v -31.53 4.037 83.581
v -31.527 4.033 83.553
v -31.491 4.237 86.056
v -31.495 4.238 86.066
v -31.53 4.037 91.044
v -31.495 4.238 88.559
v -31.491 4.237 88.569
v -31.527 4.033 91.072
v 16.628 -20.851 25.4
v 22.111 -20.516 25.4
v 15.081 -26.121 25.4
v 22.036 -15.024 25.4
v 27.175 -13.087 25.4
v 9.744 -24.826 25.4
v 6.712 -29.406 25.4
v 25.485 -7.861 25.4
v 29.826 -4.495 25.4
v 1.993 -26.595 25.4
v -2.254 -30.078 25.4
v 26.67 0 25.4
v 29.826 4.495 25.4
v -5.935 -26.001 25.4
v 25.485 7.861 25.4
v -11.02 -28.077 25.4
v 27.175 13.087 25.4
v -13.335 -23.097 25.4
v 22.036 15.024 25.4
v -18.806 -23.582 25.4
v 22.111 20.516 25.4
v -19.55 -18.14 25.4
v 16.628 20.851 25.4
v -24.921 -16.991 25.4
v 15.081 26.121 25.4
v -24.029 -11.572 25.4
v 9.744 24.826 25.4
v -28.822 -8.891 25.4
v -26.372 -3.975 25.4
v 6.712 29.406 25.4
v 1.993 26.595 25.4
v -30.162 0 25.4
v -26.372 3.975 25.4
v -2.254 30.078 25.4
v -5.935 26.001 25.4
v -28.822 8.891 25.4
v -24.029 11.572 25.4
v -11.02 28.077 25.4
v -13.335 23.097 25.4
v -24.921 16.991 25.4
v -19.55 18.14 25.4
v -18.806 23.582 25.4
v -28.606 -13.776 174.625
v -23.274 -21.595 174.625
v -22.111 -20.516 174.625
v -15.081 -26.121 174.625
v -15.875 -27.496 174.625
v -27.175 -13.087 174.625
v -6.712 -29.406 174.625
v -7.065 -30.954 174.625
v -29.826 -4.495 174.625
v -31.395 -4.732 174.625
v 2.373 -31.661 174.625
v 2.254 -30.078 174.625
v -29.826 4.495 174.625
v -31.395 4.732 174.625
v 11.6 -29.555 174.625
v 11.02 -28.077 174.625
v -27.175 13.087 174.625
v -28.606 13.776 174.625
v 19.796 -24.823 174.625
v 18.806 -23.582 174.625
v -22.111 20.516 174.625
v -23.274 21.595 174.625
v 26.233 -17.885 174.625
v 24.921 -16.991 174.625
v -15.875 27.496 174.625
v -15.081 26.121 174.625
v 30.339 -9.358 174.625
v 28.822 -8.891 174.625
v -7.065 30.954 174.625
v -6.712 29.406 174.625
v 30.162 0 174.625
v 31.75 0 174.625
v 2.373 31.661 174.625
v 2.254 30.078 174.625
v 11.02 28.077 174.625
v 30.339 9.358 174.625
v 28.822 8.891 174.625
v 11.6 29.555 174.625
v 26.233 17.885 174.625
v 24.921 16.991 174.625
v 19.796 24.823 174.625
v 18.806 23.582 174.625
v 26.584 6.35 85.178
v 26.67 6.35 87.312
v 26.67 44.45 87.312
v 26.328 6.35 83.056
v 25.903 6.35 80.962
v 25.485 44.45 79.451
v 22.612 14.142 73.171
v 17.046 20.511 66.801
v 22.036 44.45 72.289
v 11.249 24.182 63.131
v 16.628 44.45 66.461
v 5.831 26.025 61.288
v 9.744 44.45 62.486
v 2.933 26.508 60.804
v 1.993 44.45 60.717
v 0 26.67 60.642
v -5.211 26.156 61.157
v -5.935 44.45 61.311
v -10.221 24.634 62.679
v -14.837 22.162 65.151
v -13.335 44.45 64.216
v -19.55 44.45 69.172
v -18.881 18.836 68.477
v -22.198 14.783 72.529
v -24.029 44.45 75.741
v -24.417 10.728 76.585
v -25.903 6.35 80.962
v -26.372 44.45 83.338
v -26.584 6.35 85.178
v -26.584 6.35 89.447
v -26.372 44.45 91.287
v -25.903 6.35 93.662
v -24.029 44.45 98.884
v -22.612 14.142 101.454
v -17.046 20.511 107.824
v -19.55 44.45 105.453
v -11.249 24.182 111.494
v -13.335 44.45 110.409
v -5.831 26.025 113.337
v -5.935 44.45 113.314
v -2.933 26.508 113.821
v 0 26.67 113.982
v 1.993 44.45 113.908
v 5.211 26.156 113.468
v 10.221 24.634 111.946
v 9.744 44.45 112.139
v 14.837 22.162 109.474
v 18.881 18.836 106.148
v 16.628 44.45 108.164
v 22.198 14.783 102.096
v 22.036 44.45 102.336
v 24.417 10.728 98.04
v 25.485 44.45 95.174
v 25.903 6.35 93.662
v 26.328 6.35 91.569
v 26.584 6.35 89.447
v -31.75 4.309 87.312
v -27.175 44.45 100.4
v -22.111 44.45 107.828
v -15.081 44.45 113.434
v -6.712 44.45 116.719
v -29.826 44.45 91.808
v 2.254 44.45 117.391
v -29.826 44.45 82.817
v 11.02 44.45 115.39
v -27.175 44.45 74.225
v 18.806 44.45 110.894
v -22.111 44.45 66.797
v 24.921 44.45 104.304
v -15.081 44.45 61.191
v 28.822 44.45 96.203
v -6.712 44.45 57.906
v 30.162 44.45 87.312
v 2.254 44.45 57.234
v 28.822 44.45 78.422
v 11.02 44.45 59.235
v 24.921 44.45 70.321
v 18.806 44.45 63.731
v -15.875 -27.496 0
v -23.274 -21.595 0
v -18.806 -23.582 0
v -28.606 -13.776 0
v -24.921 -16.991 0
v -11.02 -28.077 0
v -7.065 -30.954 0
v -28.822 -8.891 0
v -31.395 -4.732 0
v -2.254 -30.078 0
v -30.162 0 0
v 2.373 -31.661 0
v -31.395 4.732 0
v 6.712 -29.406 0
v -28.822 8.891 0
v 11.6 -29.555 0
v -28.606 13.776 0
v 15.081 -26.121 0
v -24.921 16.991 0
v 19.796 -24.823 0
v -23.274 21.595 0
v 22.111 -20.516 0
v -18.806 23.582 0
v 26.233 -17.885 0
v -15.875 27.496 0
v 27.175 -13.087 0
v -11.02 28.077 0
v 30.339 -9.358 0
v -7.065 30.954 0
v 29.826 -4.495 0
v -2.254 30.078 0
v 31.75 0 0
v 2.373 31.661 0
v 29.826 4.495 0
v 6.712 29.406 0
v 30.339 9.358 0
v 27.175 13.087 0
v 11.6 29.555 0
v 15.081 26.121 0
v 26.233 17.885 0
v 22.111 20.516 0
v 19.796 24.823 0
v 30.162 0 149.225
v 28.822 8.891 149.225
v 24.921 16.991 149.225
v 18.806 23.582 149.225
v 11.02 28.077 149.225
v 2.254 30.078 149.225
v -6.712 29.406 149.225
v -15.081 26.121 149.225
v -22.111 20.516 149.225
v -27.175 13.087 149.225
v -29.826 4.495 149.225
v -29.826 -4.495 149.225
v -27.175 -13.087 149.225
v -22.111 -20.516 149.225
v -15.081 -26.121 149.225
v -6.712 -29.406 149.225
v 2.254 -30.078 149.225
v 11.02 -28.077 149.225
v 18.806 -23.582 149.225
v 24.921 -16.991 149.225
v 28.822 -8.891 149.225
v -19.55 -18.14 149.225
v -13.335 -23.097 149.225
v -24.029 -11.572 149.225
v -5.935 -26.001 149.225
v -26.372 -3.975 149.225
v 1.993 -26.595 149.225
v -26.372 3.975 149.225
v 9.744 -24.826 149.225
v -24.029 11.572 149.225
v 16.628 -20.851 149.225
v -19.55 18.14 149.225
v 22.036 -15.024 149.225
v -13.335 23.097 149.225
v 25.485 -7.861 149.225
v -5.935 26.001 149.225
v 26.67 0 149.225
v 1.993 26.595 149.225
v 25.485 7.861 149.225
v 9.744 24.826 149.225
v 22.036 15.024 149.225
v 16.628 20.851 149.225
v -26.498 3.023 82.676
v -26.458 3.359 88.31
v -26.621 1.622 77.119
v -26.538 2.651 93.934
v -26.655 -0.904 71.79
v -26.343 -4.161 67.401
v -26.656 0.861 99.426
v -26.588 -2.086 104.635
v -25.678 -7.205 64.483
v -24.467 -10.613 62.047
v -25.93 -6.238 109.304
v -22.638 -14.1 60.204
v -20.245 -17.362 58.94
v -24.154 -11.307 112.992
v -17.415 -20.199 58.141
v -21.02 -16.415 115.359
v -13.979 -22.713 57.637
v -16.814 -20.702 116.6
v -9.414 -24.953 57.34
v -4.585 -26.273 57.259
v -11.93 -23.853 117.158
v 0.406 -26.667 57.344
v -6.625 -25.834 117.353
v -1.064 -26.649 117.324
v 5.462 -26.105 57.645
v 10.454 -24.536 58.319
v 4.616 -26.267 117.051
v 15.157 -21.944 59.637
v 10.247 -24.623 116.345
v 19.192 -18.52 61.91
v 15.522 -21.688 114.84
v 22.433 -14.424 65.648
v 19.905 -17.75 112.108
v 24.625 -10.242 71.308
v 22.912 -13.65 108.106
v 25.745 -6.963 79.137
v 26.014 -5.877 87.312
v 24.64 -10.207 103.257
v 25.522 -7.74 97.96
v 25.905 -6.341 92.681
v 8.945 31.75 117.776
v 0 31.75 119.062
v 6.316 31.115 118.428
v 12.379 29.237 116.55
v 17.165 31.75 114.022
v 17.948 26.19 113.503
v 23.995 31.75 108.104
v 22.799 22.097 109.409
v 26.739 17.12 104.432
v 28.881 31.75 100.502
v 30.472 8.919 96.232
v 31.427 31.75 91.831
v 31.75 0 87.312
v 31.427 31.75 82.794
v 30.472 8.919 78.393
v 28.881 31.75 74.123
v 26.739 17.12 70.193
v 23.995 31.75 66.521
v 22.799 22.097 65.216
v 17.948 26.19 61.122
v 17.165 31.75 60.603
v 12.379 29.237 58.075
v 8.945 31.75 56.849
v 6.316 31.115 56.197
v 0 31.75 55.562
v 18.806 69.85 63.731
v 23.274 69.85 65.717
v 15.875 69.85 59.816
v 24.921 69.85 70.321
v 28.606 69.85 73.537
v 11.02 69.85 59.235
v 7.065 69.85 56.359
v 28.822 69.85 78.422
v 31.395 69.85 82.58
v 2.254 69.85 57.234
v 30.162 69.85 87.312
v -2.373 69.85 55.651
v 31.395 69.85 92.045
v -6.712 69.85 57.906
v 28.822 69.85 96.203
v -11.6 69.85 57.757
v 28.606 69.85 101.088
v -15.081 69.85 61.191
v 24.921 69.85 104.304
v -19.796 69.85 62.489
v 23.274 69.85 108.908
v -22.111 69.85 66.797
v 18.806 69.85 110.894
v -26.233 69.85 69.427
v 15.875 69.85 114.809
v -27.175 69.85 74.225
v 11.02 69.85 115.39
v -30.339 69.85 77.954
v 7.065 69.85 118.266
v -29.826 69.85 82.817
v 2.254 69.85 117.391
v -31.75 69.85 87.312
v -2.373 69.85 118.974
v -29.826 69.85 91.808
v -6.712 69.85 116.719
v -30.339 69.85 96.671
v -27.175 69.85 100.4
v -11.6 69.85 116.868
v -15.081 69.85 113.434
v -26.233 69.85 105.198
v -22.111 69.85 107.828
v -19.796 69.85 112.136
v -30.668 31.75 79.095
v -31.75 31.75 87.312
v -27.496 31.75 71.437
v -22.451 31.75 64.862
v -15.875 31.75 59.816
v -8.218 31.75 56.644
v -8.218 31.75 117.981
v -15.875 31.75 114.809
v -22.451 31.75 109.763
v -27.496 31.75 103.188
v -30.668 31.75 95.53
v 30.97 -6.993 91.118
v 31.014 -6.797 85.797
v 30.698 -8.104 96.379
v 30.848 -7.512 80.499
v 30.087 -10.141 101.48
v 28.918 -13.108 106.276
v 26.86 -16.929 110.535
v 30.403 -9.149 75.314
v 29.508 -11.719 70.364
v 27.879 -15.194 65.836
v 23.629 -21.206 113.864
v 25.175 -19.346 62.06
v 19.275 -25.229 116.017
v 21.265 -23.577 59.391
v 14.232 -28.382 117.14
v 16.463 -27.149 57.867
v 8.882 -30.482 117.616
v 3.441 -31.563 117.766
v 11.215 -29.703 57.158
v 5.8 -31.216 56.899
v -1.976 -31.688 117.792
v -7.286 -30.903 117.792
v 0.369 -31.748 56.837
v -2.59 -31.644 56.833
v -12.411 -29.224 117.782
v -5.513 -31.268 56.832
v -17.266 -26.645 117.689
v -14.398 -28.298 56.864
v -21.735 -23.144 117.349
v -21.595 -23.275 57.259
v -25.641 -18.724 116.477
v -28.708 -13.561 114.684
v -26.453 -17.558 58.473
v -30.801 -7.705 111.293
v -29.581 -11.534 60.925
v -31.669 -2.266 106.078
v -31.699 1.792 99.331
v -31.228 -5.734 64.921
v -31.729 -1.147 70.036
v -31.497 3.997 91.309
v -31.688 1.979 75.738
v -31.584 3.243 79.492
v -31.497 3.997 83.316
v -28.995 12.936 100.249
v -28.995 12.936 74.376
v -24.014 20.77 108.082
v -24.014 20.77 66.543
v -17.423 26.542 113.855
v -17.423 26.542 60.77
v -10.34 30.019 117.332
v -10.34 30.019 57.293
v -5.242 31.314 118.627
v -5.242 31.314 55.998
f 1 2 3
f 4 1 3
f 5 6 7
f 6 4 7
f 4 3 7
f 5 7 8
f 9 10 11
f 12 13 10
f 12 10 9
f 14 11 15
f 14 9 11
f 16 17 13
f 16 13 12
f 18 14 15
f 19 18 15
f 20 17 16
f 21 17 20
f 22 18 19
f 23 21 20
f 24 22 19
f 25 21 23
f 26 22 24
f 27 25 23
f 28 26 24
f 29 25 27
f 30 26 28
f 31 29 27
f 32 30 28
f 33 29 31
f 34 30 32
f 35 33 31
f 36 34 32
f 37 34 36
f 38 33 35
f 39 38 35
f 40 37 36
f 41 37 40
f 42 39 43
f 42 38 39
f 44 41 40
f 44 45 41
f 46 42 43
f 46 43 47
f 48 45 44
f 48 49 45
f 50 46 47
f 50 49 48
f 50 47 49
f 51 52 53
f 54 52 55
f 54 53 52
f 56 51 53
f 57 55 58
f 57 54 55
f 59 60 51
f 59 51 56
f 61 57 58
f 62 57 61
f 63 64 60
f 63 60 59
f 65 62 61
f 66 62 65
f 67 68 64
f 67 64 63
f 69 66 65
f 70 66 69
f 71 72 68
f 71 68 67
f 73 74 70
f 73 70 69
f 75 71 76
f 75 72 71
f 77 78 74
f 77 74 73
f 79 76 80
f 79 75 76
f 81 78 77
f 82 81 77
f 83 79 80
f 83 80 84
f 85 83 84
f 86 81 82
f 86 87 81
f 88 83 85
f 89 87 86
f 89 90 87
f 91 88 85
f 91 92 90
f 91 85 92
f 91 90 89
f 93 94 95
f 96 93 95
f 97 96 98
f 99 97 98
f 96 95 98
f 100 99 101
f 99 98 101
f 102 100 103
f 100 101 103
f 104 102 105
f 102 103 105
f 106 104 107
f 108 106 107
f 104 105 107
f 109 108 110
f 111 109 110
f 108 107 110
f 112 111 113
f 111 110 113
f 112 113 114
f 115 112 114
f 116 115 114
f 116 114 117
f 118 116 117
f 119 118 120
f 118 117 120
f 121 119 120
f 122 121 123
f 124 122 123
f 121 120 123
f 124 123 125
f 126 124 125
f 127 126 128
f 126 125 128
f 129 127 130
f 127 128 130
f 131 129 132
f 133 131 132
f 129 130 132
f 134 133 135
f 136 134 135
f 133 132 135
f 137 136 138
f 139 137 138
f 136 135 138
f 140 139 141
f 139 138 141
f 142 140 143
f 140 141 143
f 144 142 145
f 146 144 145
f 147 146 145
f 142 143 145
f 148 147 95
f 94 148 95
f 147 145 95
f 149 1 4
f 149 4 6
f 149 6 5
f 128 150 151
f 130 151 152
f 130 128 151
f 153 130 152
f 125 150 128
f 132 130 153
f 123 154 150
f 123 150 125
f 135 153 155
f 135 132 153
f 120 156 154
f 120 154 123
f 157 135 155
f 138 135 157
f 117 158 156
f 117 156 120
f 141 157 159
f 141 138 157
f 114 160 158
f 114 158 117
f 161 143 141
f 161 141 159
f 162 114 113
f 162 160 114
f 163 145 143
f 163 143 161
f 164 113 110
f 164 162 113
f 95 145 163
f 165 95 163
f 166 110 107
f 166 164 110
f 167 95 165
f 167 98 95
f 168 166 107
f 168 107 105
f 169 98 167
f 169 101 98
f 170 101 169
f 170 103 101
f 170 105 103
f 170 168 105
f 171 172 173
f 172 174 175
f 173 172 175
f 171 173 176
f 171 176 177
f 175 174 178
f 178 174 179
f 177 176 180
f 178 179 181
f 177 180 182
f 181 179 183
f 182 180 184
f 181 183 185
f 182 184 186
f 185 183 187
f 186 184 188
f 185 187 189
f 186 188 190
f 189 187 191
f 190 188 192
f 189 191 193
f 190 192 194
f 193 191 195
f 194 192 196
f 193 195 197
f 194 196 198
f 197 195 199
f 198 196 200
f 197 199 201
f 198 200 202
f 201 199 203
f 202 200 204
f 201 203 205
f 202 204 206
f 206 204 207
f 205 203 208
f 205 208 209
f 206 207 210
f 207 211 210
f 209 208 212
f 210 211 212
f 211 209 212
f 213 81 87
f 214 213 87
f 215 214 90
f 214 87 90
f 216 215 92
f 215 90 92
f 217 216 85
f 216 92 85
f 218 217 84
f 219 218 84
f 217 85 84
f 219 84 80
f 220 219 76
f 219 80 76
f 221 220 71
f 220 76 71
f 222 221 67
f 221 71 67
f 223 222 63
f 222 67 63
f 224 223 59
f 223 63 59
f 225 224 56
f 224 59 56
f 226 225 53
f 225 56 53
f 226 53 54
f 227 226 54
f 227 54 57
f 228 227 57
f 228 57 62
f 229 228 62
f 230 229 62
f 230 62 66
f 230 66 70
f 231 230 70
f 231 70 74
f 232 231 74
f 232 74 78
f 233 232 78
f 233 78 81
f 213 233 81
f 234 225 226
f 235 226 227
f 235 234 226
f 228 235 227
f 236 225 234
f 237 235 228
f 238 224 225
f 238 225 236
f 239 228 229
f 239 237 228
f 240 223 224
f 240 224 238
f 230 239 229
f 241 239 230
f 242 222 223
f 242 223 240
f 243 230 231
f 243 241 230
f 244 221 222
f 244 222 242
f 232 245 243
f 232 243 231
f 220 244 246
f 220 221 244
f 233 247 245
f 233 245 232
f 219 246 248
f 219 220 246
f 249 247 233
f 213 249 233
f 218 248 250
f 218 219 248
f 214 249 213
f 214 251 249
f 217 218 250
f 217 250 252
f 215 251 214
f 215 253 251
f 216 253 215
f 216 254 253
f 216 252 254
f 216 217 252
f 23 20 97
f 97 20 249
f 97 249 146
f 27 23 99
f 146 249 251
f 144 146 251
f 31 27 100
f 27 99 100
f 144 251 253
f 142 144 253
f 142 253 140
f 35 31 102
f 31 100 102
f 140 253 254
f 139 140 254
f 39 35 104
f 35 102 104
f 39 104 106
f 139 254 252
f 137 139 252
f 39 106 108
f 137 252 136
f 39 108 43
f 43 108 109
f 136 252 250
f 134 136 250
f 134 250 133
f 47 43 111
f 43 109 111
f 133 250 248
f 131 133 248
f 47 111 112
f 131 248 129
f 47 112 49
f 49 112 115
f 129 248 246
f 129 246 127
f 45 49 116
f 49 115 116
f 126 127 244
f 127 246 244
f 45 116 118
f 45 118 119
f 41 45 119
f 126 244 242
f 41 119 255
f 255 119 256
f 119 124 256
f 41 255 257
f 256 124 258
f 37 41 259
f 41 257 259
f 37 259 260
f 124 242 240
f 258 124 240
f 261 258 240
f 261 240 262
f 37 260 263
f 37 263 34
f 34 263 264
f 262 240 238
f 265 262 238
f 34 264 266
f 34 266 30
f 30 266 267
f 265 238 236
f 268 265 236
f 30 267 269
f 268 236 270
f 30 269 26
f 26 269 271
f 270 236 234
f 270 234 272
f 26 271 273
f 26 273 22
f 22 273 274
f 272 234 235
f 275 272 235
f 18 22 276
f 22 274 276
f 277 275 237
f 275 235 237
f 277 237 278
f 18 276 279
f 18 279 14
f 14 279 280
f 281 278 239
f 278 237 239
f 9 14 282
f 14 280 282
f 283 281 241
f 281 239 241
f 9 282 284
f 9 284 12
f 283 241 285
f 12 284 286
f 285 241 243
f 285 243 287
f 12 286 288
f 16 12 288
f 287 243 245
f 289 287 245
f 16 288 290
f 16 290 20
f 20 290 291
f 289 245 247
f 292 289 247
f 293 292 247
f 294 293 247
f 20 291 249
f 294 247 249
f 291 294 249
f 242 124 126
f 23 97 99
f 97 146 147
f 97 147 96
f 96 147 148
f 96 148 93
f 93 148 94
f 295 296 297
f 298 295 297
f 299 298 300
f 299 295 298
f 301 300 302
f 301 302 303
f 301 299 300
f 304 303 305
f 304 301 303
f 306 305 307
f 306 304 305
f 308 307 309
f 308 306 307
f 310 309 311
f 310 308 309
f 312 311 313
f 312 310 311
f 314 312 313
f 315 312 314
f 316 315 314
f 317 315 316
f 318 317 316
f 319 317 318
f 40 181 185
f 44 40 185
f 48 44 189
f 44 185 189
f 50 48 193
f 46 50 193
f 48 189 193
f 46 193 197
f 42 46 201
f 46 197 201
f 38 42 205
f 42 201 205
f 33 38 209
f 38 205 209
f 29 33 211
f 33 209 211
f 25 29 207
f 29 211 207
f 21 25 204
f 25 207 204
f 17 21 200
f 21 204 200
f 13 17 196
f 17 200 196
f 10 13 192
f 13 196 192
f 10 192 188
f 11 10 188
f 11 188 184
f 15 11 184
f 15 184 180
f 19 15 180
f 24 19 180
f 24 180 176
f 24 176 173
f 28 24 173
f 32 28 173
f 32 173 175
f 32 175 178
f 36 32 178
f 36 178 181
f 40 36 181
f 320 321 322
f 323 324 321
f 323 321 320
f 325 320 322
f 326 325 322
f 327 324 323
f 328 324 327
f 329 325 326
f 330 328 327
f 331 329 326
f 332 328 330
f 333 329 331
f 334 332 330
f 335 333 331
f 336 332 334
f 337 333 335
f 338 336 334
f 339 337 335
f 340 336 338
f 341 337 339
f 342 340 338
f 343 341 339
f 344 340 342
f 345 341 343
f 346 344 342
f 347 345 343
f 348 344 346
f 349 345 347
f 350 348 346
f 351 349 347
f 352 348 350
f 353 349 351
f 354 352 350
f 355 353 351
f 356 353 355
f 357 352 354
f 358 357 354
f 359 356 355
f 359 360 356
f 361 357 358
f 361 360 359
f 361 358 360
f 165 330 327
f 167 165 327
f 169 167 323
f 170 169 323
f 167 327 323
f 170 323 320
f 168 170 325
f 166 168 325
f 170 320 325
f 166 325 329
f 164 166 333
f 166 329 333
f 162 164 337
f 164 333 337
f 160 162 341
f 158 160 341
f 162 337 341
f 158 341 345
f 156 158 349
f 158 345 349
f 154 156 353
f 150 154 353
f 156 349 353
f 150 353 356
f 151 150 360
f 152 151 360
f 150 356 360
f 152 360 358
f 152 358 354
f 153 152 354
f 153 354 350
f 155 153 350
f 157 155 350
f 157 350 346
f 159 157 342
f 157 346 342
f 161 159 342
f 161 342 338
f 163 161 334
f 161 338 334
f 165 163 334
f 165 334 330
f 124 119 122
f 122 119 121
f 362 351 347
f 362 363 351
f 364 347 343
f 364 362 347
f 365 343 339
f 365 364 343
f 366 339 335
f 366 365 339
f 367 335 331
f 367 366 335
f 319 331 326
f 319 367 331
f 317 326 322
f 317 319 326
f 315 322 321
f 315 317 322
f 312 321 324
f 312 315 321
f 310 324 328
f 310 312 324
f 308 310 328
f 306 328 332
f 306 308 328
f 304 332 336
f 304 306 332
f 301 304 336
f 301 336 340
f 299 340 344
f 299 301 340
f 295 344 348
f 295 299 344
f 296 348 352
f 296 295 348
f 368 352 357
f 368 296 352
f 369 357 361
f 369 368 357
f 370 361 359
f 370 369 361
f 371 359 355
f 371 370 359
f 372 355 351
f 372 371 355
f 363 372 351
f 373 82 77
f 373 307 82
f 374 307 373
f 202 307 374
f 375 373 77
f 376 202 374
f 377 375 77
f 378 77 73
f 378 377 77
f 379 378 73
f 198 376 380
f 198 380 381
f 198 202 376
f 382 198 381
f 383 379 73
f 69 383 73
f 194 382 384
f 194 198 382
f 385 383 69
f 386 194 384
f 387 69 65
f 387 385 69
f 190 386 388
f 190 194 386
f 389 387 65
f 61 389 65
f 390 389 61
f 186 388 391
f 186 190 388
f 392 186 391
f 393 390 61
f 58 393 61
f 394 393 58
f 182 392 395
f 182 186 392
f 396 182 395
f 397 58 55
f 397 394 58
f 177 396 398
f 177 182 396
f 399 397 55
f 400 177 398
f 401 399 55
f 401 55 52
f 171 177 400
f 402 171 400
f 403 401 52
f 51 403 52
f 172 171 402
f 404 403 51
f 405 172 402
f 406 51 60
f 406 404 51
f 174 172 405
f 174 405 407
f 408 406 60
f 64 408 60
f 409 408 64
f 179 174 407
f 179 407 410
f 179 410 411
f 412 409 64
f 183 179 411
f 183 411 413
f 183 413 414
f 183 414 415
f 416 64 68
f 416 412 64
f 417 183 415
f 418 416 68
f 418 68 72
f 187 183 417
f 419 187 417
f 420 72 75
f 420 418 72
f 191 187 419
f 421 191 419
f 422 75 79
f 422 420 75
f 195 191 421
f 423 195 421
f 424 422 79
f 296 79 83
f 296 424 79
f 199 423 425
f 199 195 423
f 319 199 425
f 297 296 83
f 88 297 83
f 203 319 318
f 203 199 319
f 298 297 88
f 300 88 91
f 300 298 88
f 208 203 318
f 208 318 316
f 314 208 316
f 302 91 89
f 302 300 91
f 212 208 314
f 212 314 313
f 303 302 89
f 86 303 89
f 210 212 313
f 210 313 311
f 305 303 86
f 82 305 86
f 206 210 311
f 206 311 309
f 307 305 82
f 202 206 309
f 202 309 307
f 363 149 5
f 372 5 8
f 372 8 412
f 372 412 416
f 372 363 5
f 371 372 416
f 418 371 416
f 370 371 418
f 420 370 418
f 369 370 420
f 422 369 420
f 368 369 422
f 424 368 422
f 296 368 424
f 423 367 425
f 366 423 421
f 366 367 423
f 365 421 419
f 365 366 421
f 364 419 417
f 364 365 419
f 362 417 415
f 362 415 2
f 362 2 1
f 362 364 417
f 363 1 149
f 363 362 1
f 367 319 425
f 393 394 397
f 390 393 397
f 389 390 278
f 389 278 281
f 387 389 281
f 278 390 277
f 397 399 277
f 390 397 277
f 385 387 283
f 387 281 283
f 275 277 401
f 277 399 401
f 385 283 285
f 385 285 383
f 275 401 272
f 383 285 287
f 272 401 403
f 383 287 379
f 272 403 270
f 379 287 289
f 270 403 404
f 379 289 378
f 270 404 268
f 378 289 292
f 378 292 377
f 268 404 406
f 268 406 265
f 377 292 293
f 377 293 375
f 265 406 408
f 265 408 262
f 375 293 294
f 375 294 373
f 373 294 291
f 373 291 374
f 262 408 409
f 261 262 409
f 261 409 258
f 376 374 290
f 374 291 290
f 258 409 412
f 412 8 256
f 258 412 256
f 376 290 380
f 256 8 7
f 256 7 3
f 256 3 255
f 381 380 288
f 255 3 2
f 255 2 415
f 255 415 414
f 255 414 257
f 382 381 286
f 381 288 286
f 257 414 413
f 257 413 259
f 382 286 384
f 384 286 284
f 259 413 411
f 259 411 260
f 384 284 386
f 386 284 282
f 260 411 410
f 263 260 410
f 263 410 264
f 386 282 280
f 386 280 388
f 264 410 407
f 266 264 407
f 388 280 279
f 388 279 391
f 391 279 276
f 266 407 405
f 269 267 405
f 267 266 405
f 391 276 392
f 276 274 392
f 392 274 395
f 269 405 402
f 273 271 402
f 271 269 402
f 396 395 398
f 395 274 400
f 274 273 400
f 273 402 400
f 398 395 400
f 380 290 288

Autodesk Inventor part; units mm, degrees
ref_plane "YZ Plane" through (0, 0, 0) normal (1, 0, 0) x (0, 1, 0)
sketch "Sketch1" plane through (0, 0, 0) normal (0, 0, 1) x (1, 0, 0)
  circle A0 centre (0, 0) radius 31.75
  dimension "d0" = 63.5
extrude "mainBody" add sketch "Sketch1" along normal blind 174.625
sketch "Sketch10" plane through (0, 0, 174.625) normal (0, 0, 1) x (1, 0, 0)
  circle A0 centre (0, 0) radius 30.1625 projected
  circle A1 centre (0, 0) radius 31.75 projected
  point P0 (0, 31.75)
ref_plane "Work Plane5" through (0, 31.75, 174.625) normal (0, 1, 0) x (-1, 0, 0)
sketch "Sketch11" plane through (0, 31.75, 174.625) normal (0, 1, 0) x (-1, 0, 0)
  circle A0 centre (0, -87.3125) radius 31.75
  line L0 (31.75, 0) -> (-31.75, 0) projected
  point P0 (0, -174.625)
  dimension "d29" = 87.3125
  dimension "d30" = 63.5
extrude "TBody" add sketch "Sketch11" along normal blind 38.1 and the other way blind 31.75
sketch "Sketch12" plane through (0, 69.85, 87.3125) normal (0, 1, 0) x (1, 0, 0)
  circle A0 centre (0, 0) radius 31.75 projected
  circle A1 centre (0, 0) radius 30.1625
  point P0 (0, 87.3125)
  dimension "d35" = 60.325
extrude "TSocket" cut sketch "Sketch12" against normal blind 25.4 contours A1
sketch "Sketch13" plane through (0, 44.45, 87.3125) normal (0, 1, 0) x (1, 0, 0)
  circle A0 centre (0, 0) radius 30.1625 projected
  circle A1 centre (0, 0) radius 26.67
  point P0 (0, 87.3125)
  dimension "d39" = 53.34
extrude "TTube" cut sketch "Sketch13" against normal blind 38.1 contours A1
sketch "Sketch14" plane through (0, 0, 174.625) normal (0, 0, 1) x (1, 0, 0)
  circle A0 centre (0, 0) radius 31.75 projected
  circle A1 centre (0, 0) radius 26.67
  dimension "d43" = 53.34
extrude "mainTube" cut sketch "Sketch14" against normal blind 177.8 contours A1
sketch "Sketch15" plane through (0, 0, 174.625) normal (0, 0, 1) x (1, 0, 0)
  circle A0 centre (0, 0) radius 26.67 projected
  circle A1 centre (0, 0) radius 31.75 projected
  circle A2 centre (0, 0) radius 30.1625
  dimension "d47" = 60.325
extrude "mainSocket1" cut sketch "Sketch15" against normal blind 25.4 contours A2
sketch "Sketch16" plane through (0, 0, 0) normal (0, 0, -1) x (-1, 0, 0)
  circle A0 centre (0, 0) radius 26.67 projected
  circle A1 centre (0, 0) radius 31.75 projected
  circle A2 centre (0, 0) radius 30.1625
  dimension "d51" = 60.325
extrude "mainSocket2" cut sketch "Sketch16" against normal blind 25.4 contours A2
sketch "Sketch23" plane through (0, 0, 174.625) normal (0, 0, 1) x (1, 0, 0)
  circle A0 centre (0, 0) radius 30.1625 projected
  circle A1 centre (0, 0) radius 31.75 projected
  line L0 (0, 0) -> (-50.0282, 8.8213)
  line L1 (0, 0) -> (50.8, 0) construction
  line L2 (-55.321, -21.1956) -> (-2.6667, -30.48)
  line L3 (-2.6667, -30.48) -> (50.8, -30.48)
  line L4 (-29.3824, 16.2053) -> (-36.5604, -24.5036)
  point P0 (-31.2676, 5.5133)
  dimension "d67" = 50.8
  dimension "d68" = 170
  dimension "d69" = 30.48
ref_plane "Work Plane9" through (-31.2676, 5.5133, 174.625) normal (-0.9848, 0.1736, 0) x (-0.1736, -0.9848, 0)
sketch "Sketch24" plane through (-31.2676, 5.5133, 174.625) normal (-0.9848, 0.1736, 0) x (-0.1736, -0.9848, 0)
  circle A0 centre (31.75, -87.3125) radius 30.48
  point P0 (0, -174.625)
  dimension "d70" = 60.96
extrude "Extrusion18" cut sketch "Sketch24" along normal mid plane 203.2
properties part number "pvc_tee" material "PVC-Piping"
